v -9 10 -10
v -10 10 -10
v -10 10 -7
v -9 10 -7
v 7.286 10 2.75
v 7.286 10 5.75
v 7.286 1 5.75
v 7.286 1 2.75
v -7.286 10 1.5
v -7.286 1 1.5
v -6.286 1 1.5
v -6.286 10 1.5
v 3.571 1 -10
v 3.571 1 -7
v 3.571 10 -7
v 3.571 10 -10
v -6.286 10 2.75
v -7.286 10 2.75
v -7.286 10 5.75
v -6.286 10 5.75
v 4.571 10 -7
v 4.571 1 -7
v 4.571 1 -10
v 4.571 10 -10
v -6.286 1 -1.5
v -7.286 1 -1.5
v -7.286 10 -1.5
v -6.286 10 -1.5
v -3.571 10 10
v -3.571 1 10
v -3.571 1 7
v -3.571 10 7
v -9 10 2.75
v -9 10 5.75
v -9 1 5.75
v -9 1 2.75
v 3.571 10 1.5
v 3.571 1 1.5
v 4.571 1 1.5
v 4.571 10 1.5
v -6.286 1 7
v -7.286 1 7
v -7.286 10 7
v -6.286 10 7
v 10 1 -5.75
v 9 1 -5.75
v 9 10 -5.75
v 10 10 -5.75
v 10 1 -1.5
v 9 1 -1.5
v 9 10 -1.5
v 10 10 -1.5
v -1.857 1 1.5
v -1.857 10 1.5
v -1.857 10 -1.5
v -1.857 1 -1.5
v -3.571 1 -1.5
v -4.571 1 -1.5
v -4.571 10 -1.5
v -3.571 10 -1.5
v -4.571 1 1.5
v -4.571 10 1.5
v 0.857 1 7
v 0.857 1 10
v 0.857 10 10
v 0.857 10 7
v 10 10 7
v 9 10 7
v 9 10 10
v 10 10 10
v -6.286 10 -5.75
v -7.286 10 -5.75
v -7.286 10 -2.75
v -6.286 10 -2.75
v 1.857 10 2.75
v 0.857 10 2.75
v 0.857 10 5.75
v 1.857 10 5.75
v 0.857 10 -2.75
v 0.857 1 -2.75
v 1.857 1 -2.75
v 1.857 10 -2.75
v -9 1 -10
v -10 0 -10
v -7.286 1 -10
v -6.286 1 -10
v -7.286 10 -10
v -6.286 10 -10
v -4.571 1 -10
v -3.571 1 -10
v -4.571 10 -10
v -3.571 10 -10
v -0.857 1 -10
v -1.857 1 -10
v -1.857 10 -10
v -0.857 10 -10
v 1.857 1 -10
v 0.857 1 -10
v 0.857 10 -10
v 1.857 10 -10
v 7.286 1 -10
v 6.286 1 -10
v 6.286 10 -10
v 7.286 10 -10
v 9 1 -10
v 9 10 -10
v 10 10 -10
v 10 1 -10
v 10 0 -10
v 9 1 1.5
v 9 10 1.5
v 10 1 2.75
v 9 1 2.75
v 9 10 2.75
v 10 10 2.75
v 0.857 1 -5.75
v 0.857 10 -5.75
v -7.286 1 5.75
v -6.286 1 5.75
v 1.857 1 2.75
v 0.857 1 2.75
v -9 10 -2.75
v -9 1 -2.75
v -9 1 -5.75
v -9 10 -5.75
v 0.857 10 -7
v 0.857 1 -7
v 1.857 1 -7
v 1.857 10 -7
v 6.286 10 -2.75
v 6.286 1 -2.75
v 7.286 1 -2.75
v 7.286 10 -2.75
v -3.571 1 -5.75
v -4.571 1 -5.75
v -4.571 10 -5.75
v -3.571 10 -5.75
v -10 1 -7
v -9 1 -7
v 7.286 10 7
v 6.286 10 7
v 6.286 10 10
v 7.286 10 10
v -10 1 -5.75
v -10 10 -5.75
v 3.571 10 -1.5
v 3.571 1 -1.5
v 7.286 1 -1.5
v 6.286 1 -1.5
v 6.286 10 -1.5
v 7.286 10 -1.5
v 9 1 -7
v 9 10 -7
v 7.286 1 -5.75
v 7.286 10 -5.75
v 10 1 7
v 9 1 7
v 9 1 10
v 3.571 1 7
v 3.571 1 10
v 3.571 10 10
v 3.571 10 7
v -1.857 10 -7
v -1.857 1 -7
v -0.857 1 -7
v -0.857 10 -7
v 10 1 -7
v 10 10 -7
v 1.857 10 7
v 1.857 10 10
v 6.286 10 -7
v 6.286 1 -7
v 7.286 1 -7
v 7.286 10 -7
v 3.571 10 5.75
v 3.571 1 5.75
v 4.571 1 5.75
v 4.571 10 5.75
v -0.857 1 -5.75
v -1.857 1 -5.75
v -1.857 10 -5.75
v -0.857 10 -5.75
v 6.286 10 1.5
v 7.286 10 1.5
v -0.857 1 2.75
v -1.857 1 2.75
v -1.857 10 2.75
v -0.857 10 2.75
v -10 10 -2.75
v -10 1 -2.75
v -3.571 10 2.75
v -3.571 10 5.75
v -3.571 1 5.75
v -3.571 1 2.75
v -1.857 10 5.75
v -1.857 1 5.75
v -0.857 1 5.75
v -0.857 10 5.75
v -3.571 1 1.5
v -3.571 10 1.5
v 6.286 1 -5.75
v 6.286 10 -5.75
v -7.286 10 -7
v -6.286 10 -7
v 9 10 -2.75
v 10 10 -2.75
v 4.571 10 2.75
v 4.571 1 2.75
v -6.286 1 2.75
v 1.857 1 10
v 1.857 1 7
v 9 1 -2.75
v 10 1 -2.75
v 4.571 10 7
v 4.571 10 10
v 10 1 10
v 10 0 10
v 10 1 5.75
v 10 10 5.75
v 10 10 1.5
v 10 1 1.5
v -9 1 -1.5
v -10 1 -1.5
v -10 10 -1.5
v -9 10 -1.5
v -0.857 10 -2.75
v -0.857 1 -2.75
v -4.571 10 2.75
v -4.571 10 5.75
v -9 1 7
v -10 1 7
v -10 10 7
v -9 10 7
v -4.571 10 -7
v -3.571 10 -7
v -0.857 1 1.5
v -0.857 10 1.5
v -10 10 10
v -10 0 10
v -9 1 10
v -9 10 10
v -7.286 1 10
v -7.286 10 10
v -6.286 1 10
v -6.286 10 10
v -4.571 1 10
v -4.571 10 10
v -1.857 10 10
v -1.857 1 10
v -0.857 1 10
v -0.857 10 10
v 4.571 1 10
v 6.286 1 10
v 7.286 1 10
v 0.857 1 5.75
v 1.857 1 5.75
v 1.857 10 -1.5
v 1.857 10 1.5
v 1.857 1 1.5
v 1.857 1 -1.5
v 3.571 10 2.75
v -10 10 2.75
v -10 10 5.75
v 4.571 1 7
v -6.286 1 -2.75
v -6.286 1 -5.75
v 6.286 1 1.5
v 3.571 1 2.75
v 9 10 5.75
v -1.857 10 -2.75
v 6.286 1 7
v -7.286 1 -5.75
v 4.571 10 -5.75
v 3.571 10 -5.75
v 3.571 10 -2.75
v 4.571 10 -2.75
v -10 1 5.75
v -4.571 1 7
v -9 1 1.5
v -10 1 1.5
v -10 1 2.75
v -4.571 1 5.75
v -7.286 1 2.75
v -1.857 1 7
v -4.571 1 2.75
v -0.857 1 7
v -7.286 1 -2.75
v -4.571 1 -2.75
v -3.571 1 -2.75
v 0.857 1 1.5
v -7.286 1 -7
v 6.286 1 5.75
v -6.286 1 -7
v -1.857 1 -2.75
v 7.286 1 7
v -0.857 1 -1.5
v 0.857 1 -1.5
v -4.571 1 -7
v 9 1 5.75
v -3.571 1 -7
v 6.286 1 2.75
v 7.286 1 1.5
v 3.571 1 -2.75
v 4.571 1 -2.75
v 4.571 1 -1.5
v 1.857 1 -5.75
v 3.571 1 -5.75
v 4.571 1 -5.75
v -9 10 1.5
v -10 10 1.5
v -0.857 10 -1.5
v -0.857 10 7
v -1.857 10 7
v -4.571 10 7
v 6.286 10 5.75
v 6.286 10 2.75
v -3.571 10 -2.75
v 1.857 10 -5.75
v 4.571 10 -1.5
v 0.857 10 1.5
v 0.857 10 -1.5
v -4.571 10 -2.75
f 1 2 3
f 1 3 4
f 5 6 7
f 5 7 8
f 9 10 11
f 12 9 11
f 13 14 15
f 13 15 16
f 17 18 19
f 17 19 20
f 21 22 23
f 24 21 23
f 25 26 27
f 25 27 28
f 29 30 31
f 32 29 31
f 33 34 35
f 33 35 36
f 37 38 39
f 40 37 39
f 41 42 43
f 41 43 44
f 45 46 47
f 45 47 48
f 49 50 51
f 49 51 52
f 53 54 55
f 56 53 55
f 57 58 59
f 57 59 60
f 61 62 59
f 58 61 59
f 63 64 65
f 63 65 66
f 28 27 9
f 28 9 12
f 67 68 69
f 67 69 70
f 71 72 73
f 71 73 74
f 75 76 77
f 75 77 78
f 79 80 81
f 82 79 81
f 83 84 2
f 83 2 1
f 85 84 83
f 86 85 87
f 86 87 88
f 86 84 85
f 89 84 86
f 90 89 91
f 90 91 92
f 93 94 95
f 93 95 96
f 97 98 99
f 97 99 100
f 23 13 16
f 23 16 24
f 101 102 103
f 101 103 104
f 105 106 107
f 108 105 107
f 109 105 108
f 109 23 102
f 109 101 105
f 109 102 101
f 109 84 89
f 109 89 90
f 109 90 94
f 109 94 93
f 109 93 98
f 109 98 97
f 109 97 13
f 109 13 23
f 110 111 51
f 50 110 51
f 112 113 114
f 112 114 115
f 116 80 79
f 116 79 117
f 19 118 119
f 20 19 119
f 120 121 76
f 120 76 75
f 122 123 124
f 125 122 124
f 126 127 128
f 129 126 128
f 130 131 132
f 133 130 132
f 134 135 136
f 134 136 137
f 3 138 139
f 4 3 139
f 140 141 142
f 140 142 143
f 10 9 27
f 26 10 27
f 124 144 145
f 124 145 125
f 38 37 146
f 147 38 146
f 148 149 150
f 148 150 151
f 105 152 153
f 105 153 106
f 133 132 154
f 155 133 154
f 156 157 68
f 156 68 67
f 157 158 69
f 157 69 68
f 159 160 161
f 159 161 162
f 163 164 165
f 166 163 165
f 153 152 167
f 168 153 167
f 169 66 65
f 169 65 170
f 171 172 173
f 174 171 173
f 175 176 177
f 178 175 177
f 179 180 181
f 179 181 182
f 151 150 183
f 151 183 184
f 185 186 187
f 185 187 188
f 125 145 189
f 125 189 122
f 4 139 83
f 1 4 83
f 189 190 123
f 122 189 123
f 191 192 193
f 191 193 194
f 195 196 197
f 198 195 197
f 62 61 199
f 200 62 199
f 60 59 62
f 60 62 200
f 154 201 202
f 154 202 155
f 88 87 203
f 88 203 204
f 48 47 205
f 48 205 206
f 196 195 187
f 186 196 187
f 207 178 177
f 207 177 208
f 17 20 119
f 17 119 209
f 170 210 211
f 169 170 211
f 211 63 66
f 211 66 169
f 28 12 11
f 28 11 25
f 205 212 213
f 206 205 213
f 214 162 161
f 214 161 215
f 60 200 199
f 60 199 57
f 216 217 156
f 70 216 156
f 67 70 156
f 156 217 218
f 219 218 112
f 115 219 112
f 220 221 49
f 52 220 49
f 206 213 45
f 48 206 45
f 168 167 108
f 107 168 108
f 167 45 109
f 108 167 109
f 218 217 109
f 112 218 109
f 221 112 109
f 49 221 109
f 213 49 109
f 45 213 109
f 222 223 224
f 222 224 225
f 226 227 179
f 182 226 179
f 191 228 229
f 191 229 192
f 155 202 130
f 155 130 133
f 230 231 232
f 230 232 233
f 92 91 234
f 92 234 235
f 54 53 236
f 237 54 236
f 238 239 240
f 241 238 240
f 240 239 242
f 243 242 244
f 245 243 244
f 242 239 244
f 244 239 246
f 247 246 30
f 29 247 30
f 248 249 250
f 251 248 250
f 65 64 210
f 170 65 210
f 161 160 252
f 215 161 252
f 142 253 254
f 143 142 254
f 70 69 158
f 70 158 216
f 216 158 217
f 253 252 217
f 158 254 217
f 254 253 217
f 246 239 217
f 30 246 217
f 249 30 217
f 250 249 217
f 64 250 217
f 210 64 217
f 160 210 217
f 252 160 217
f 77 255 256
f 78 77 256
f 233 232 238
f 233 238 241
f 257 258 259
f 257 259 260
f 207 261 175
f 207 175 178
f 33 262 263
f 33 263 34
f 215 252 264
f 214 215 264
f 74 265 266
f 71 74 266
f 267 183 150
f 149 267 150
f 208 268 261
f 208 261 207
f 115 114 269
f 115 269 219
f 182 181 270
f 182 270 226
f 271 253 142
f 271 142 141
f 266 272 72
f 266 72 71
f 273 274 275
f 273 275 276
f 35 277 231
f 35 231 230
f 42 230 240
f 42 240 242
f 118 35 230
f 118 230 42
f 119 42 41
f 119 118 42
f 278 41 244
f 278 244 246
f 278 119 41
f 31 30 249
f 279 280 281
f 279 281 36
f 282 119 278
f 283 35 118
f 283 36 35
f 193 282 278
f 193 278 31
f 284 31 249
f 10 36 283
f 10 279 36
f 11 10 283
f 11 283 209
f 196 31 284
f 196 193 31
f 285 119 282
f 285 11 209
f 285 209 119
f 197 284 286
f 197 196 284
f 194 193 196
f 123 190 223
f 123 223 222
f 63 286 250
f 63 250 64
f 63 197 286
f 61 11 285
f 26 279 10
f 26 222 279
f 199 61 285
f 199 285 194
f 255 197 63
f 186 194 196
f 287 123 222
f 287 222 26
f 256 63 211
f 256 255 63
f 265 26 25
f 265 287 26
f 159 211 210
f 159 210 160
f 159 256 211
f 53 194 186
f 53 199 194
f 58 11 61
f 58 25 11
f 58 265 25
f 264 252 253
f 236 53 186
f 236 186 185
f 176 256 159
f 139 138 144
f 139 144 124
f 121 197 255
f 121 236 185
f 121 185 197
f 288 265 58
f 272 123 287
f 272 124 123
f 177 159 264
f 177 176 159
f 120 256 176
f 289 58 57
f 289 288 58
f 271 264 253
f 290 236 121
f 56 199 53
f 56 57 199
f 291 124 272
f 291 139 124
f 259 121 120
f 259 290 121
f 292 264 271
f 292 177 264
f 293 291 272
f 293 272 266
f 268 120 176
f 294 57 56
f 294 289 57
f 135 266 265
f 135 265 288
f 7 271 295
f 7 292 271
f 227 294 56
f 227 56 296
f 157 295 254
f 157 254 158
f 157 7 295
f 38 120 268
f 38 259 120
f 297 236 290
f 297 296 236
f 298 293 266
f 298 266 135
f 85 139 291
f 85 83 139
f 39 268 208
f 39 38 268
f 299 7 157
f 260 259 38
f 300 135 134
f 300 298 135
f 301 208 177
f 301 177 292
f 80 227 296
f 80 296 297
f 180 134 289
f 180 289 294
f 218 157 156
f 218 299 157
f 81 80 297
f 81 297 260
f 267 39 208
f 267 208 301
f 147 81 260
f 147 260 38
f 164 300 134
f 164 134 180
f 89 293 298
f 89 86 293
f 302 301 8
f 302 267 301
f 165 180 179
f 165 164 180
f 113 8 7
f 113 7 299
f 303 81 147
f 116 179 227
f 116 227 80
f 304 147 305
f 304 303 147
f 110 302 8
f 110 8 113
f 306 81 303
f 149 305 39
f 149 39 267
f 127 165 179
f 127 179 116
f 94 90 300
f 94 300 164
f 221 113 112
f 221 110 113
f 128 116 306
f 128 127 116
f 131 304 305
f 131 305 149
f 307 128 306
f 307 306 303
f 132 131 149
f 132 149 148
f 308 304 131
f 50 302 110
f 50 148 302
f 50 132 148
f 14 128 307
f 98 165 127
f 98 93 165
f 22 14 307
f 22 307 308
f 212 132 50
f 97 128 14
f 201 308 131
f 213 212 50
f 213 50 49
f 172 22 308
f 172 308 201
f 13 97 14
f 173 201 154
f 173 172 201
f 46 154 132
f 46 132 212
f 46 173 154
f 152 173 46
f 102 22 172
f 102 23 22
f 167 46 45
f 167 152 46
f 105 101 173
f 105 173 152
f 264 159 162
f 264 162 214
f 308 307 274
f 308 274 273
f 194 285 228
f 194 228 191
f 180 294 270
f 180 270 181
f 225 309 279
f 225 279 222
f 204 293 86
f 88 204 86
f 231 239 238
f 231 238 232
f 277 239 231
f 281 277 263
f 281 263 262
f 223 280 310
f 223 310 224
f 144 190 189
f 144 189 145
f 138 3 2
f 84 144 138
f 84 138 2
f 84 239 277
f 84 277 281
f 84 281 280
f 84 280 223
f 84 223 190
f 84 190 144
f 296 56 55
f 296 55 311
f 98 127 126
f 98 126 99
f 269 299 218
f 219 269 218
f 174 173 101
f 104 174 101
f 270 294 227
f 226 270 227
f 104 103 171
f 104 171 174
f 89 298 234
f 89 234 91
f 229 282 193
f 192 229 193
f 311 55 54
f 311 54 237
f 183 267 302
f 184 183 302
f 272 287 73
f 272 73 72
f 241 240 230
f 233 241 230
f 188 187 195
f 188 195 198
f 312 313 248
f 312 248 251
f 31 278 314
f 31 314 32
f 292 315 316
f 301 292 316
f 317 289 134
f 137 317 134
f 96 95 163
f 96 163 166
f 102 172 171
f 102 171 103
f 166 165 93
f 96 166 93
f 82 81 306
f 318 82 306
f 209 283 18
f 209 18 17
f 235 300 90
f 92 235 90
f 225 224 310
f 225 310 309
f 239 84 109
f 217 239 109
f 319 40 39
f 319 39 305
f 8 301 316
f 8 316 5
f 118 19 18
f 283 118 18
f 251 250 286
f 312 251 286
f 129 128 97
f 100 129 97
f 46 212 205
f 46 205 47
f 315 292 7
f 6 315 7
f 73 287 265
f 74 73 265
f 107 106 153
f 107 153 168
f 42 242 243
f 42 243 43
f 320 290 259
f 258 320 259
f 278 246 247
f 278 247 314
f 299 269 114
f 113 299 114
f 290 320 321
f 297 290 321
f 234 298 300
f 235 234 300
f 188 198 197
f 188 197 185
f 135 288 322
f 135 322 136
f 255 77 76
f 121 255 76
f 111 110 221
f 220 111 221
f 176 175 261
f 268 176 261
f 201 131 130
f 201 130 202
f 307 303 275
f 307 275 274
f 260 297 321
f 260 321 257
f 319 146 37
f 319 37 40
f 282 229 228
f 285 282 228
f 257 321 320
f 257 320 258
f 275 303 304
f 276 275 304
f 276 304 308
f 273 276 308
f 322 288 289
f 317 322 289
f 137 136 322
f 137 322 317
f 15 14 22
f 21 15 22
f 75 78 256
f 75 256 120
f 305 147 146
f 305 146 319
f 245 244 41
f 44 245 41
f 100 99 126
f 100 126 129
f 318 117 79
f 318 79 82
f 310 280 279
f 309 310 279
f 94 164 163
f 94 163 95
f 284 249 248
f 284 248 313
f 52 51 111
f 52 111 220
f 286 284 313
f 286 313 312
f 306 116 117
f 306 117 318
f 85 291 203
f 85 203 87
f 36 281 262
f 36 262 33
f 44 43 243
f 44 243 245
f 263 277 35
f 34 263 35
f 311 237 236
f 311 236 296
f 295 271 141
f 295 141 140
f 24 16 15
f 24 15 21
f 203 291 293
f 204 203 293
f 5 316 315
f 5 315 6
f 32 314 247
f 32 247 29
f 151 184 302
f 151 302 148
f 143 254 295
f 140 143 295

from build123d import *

# Parameters (mm, degrees)
SKETCH1_W           = 20
SKETCH1_H           = 20
BOSS_EXTRUDE1_DEPTH = 1
SKETCH2_W           = 1
SKETCH2_H           = 3
BOSS_EXTRUDE2_DEPTH = 9


with BuildPart() as part:
    # Sketch1 → Boss-Extrude1 (new body)
    with BuildSketch(Plane(origin=(0, 0, 0), x_dir=(1, 0, 0), z_dir=(0, 1, 0))):
        Rectangle(SKETCH1_W, SKETCH1_H)
    extrude(amount=BOSS_EXTRUDE1_DEPTH)

    # Sketch2 → Boss-Extrude2 (add)
    with BuildSketch(Plane(origin=(0, 1, 0), x_dir=(1, 0, 0), z_dir=(0, 1, 0))):
        with Locations((-9.5, 8.5)):
            Rectangle(SKETCH2_W, SKETCH2_H)
        with Locations((-6.78571429, 8.5)):
            Rectangle(SKETCH2_W, SKETCH2_H)
        with Locations((-4.07142858, 8.5)):
            Rectangle(SKETCH2_W, SKETCH2_H)
        with Locations((-1.35714287, 8.5)):
            Rectangle(SKETCH2_W, SKETCH2_H)
        with Locations((1.35714284, 8.5)):
            Rectangle(SKETCH2_W, SKETCH2_H)
        with Locations((4.07142855, 8.5)):
            Rectangle(SKETCH2_W, SKETCH2_H)
        with Locations((6.78571426, 8.5)):
            Rectangle(SKETCH2_W, SKETCH2_H)
        with Locations((9.49999997, 8.5)):
            Rectangle(SKETCH2_W, SKETCH2_H)
        with Locations((6.78571426, 4.25)):
            Rectangle(SKETCH2_W, SKETCH2_H)
        with Locations((4.07142855, 4.25)):
            Rectangle(SKETCH2_W, SKETCH2_H)
        with Locations((1.35714284, 4.25)):
            Rectangle(SKETCH2_W, SKETCH2_H)
        with Locations((-1.35714287, 4.25)):
            Rectangle(SKETCH2_W, SKETCH2_H)
        with Locations((-4.07142858, 4.25)):
            Rectangle(SKETCH2_W, SKETCH2_H)
        with Locations((-9.5, 4.25)):
            Rectangle(SKETCH2_W, SKETCH2_H)
        with Locations((-6.78571429, 0)):
            Rectangle(SKETCH2_W, SKETCH2_H)
        with Locations((-4.07142858, 0)):
            Rectangle(SKETCH2_W, SKETCH2_H)
        with Locations((-1.35714287, 0)):
            Rectangle(SKETCH2_W, SKETCH2_H)
        with Locations((1.35714284, 0)):
            Rectangle(SKETCH2_W, SKETCH2_H)
        with Locations((6.78571426, 0)):
            Rectangle(SKETCH2_W, SKETCH2_H)
        with Locations((9.49999997, 0)):
            Rectangle(SKETCH2_W, SKETCH2_H)
        with Locations((9.49999997, -4.25)):
            Rectangle(SKETCH2_W, SKETCH2_H)
        with Locations((6.78571426, -4.25)):
            Rectangle(SKETCH2_W, SKETCH2_H)
        with Locations((4.07142855, -4.25)):
            Rectangle(SKETCH2_W, SKETCH2_H)
        with Locations((1.35714284, -4.25)):
            Rectangle(SKETCH2_W, SKETCH2_H)
        with Locations((-1.35714287, -4.25)):
            Rectangle(SKETCH2_W, SKETCH2_H)
        with Locations((-4.07142858, -4.25)):
            Rectangle(SKETCH2_W, SKETCH2_H)
        with Locations((-6.78571429, -4.25)):
            Rectangle(SKETCH2_W, SKETCH2_H)
        with Locations((-9.5, -4.25)):
            Rectangle(SKETCH2_W, SKETCH2_H)
        with Locations((-9.5, -8.5)):
            Rectangle(SKETCH2_W, SKETCH2_H)
        with Locations((-6.78571429, -8.5)):
            Rectangle(SKETCH2_W, SKETCH2_H)
        with Locations((-4.07142858, -8.5)):
            Rectangle(SKETCH2_W, SKETCH2_H)
        with Locations((-1.35714287, -8.5)):
            Rectangle(SKETCH2_W, SKETCH2_H)
        with Locations((1.35714284, -8.5)):
            Rectangle(SKETCH2_W, SKETCH2_H)
        with Locations((4.07142855, -8.5)):
            Rectangle(SKETCH2_W, SKETCH2_H)
        with Locations((6.78571426, -8.5)):
            Rectangle(SKETCH2_W, SKETCH2_H)
        with Locations((9.49999997, -8.5)):
            Rectangle(SKETCH2_W, SKETCH2_H)
        with Locations((9.49999997, 4.25)):
            Rectangle(SKETCH2_W, SKETCH2_H)
        with Locations((-6.78571429, 4.25)):
            Rectangle(SKETCH2_W, SKETCH2_H)
        with Locations((-9.5, 0)):
            Rectangle(SKETCH2_W, SKETCH2_H)
        with Locations((4.07142855, 0)):
            Rectangle(SKETCH2_W, SKETCH2_H)
    extrude(amount=BOSS_EXTRUDE2_DEPTH)


solid = part.part
